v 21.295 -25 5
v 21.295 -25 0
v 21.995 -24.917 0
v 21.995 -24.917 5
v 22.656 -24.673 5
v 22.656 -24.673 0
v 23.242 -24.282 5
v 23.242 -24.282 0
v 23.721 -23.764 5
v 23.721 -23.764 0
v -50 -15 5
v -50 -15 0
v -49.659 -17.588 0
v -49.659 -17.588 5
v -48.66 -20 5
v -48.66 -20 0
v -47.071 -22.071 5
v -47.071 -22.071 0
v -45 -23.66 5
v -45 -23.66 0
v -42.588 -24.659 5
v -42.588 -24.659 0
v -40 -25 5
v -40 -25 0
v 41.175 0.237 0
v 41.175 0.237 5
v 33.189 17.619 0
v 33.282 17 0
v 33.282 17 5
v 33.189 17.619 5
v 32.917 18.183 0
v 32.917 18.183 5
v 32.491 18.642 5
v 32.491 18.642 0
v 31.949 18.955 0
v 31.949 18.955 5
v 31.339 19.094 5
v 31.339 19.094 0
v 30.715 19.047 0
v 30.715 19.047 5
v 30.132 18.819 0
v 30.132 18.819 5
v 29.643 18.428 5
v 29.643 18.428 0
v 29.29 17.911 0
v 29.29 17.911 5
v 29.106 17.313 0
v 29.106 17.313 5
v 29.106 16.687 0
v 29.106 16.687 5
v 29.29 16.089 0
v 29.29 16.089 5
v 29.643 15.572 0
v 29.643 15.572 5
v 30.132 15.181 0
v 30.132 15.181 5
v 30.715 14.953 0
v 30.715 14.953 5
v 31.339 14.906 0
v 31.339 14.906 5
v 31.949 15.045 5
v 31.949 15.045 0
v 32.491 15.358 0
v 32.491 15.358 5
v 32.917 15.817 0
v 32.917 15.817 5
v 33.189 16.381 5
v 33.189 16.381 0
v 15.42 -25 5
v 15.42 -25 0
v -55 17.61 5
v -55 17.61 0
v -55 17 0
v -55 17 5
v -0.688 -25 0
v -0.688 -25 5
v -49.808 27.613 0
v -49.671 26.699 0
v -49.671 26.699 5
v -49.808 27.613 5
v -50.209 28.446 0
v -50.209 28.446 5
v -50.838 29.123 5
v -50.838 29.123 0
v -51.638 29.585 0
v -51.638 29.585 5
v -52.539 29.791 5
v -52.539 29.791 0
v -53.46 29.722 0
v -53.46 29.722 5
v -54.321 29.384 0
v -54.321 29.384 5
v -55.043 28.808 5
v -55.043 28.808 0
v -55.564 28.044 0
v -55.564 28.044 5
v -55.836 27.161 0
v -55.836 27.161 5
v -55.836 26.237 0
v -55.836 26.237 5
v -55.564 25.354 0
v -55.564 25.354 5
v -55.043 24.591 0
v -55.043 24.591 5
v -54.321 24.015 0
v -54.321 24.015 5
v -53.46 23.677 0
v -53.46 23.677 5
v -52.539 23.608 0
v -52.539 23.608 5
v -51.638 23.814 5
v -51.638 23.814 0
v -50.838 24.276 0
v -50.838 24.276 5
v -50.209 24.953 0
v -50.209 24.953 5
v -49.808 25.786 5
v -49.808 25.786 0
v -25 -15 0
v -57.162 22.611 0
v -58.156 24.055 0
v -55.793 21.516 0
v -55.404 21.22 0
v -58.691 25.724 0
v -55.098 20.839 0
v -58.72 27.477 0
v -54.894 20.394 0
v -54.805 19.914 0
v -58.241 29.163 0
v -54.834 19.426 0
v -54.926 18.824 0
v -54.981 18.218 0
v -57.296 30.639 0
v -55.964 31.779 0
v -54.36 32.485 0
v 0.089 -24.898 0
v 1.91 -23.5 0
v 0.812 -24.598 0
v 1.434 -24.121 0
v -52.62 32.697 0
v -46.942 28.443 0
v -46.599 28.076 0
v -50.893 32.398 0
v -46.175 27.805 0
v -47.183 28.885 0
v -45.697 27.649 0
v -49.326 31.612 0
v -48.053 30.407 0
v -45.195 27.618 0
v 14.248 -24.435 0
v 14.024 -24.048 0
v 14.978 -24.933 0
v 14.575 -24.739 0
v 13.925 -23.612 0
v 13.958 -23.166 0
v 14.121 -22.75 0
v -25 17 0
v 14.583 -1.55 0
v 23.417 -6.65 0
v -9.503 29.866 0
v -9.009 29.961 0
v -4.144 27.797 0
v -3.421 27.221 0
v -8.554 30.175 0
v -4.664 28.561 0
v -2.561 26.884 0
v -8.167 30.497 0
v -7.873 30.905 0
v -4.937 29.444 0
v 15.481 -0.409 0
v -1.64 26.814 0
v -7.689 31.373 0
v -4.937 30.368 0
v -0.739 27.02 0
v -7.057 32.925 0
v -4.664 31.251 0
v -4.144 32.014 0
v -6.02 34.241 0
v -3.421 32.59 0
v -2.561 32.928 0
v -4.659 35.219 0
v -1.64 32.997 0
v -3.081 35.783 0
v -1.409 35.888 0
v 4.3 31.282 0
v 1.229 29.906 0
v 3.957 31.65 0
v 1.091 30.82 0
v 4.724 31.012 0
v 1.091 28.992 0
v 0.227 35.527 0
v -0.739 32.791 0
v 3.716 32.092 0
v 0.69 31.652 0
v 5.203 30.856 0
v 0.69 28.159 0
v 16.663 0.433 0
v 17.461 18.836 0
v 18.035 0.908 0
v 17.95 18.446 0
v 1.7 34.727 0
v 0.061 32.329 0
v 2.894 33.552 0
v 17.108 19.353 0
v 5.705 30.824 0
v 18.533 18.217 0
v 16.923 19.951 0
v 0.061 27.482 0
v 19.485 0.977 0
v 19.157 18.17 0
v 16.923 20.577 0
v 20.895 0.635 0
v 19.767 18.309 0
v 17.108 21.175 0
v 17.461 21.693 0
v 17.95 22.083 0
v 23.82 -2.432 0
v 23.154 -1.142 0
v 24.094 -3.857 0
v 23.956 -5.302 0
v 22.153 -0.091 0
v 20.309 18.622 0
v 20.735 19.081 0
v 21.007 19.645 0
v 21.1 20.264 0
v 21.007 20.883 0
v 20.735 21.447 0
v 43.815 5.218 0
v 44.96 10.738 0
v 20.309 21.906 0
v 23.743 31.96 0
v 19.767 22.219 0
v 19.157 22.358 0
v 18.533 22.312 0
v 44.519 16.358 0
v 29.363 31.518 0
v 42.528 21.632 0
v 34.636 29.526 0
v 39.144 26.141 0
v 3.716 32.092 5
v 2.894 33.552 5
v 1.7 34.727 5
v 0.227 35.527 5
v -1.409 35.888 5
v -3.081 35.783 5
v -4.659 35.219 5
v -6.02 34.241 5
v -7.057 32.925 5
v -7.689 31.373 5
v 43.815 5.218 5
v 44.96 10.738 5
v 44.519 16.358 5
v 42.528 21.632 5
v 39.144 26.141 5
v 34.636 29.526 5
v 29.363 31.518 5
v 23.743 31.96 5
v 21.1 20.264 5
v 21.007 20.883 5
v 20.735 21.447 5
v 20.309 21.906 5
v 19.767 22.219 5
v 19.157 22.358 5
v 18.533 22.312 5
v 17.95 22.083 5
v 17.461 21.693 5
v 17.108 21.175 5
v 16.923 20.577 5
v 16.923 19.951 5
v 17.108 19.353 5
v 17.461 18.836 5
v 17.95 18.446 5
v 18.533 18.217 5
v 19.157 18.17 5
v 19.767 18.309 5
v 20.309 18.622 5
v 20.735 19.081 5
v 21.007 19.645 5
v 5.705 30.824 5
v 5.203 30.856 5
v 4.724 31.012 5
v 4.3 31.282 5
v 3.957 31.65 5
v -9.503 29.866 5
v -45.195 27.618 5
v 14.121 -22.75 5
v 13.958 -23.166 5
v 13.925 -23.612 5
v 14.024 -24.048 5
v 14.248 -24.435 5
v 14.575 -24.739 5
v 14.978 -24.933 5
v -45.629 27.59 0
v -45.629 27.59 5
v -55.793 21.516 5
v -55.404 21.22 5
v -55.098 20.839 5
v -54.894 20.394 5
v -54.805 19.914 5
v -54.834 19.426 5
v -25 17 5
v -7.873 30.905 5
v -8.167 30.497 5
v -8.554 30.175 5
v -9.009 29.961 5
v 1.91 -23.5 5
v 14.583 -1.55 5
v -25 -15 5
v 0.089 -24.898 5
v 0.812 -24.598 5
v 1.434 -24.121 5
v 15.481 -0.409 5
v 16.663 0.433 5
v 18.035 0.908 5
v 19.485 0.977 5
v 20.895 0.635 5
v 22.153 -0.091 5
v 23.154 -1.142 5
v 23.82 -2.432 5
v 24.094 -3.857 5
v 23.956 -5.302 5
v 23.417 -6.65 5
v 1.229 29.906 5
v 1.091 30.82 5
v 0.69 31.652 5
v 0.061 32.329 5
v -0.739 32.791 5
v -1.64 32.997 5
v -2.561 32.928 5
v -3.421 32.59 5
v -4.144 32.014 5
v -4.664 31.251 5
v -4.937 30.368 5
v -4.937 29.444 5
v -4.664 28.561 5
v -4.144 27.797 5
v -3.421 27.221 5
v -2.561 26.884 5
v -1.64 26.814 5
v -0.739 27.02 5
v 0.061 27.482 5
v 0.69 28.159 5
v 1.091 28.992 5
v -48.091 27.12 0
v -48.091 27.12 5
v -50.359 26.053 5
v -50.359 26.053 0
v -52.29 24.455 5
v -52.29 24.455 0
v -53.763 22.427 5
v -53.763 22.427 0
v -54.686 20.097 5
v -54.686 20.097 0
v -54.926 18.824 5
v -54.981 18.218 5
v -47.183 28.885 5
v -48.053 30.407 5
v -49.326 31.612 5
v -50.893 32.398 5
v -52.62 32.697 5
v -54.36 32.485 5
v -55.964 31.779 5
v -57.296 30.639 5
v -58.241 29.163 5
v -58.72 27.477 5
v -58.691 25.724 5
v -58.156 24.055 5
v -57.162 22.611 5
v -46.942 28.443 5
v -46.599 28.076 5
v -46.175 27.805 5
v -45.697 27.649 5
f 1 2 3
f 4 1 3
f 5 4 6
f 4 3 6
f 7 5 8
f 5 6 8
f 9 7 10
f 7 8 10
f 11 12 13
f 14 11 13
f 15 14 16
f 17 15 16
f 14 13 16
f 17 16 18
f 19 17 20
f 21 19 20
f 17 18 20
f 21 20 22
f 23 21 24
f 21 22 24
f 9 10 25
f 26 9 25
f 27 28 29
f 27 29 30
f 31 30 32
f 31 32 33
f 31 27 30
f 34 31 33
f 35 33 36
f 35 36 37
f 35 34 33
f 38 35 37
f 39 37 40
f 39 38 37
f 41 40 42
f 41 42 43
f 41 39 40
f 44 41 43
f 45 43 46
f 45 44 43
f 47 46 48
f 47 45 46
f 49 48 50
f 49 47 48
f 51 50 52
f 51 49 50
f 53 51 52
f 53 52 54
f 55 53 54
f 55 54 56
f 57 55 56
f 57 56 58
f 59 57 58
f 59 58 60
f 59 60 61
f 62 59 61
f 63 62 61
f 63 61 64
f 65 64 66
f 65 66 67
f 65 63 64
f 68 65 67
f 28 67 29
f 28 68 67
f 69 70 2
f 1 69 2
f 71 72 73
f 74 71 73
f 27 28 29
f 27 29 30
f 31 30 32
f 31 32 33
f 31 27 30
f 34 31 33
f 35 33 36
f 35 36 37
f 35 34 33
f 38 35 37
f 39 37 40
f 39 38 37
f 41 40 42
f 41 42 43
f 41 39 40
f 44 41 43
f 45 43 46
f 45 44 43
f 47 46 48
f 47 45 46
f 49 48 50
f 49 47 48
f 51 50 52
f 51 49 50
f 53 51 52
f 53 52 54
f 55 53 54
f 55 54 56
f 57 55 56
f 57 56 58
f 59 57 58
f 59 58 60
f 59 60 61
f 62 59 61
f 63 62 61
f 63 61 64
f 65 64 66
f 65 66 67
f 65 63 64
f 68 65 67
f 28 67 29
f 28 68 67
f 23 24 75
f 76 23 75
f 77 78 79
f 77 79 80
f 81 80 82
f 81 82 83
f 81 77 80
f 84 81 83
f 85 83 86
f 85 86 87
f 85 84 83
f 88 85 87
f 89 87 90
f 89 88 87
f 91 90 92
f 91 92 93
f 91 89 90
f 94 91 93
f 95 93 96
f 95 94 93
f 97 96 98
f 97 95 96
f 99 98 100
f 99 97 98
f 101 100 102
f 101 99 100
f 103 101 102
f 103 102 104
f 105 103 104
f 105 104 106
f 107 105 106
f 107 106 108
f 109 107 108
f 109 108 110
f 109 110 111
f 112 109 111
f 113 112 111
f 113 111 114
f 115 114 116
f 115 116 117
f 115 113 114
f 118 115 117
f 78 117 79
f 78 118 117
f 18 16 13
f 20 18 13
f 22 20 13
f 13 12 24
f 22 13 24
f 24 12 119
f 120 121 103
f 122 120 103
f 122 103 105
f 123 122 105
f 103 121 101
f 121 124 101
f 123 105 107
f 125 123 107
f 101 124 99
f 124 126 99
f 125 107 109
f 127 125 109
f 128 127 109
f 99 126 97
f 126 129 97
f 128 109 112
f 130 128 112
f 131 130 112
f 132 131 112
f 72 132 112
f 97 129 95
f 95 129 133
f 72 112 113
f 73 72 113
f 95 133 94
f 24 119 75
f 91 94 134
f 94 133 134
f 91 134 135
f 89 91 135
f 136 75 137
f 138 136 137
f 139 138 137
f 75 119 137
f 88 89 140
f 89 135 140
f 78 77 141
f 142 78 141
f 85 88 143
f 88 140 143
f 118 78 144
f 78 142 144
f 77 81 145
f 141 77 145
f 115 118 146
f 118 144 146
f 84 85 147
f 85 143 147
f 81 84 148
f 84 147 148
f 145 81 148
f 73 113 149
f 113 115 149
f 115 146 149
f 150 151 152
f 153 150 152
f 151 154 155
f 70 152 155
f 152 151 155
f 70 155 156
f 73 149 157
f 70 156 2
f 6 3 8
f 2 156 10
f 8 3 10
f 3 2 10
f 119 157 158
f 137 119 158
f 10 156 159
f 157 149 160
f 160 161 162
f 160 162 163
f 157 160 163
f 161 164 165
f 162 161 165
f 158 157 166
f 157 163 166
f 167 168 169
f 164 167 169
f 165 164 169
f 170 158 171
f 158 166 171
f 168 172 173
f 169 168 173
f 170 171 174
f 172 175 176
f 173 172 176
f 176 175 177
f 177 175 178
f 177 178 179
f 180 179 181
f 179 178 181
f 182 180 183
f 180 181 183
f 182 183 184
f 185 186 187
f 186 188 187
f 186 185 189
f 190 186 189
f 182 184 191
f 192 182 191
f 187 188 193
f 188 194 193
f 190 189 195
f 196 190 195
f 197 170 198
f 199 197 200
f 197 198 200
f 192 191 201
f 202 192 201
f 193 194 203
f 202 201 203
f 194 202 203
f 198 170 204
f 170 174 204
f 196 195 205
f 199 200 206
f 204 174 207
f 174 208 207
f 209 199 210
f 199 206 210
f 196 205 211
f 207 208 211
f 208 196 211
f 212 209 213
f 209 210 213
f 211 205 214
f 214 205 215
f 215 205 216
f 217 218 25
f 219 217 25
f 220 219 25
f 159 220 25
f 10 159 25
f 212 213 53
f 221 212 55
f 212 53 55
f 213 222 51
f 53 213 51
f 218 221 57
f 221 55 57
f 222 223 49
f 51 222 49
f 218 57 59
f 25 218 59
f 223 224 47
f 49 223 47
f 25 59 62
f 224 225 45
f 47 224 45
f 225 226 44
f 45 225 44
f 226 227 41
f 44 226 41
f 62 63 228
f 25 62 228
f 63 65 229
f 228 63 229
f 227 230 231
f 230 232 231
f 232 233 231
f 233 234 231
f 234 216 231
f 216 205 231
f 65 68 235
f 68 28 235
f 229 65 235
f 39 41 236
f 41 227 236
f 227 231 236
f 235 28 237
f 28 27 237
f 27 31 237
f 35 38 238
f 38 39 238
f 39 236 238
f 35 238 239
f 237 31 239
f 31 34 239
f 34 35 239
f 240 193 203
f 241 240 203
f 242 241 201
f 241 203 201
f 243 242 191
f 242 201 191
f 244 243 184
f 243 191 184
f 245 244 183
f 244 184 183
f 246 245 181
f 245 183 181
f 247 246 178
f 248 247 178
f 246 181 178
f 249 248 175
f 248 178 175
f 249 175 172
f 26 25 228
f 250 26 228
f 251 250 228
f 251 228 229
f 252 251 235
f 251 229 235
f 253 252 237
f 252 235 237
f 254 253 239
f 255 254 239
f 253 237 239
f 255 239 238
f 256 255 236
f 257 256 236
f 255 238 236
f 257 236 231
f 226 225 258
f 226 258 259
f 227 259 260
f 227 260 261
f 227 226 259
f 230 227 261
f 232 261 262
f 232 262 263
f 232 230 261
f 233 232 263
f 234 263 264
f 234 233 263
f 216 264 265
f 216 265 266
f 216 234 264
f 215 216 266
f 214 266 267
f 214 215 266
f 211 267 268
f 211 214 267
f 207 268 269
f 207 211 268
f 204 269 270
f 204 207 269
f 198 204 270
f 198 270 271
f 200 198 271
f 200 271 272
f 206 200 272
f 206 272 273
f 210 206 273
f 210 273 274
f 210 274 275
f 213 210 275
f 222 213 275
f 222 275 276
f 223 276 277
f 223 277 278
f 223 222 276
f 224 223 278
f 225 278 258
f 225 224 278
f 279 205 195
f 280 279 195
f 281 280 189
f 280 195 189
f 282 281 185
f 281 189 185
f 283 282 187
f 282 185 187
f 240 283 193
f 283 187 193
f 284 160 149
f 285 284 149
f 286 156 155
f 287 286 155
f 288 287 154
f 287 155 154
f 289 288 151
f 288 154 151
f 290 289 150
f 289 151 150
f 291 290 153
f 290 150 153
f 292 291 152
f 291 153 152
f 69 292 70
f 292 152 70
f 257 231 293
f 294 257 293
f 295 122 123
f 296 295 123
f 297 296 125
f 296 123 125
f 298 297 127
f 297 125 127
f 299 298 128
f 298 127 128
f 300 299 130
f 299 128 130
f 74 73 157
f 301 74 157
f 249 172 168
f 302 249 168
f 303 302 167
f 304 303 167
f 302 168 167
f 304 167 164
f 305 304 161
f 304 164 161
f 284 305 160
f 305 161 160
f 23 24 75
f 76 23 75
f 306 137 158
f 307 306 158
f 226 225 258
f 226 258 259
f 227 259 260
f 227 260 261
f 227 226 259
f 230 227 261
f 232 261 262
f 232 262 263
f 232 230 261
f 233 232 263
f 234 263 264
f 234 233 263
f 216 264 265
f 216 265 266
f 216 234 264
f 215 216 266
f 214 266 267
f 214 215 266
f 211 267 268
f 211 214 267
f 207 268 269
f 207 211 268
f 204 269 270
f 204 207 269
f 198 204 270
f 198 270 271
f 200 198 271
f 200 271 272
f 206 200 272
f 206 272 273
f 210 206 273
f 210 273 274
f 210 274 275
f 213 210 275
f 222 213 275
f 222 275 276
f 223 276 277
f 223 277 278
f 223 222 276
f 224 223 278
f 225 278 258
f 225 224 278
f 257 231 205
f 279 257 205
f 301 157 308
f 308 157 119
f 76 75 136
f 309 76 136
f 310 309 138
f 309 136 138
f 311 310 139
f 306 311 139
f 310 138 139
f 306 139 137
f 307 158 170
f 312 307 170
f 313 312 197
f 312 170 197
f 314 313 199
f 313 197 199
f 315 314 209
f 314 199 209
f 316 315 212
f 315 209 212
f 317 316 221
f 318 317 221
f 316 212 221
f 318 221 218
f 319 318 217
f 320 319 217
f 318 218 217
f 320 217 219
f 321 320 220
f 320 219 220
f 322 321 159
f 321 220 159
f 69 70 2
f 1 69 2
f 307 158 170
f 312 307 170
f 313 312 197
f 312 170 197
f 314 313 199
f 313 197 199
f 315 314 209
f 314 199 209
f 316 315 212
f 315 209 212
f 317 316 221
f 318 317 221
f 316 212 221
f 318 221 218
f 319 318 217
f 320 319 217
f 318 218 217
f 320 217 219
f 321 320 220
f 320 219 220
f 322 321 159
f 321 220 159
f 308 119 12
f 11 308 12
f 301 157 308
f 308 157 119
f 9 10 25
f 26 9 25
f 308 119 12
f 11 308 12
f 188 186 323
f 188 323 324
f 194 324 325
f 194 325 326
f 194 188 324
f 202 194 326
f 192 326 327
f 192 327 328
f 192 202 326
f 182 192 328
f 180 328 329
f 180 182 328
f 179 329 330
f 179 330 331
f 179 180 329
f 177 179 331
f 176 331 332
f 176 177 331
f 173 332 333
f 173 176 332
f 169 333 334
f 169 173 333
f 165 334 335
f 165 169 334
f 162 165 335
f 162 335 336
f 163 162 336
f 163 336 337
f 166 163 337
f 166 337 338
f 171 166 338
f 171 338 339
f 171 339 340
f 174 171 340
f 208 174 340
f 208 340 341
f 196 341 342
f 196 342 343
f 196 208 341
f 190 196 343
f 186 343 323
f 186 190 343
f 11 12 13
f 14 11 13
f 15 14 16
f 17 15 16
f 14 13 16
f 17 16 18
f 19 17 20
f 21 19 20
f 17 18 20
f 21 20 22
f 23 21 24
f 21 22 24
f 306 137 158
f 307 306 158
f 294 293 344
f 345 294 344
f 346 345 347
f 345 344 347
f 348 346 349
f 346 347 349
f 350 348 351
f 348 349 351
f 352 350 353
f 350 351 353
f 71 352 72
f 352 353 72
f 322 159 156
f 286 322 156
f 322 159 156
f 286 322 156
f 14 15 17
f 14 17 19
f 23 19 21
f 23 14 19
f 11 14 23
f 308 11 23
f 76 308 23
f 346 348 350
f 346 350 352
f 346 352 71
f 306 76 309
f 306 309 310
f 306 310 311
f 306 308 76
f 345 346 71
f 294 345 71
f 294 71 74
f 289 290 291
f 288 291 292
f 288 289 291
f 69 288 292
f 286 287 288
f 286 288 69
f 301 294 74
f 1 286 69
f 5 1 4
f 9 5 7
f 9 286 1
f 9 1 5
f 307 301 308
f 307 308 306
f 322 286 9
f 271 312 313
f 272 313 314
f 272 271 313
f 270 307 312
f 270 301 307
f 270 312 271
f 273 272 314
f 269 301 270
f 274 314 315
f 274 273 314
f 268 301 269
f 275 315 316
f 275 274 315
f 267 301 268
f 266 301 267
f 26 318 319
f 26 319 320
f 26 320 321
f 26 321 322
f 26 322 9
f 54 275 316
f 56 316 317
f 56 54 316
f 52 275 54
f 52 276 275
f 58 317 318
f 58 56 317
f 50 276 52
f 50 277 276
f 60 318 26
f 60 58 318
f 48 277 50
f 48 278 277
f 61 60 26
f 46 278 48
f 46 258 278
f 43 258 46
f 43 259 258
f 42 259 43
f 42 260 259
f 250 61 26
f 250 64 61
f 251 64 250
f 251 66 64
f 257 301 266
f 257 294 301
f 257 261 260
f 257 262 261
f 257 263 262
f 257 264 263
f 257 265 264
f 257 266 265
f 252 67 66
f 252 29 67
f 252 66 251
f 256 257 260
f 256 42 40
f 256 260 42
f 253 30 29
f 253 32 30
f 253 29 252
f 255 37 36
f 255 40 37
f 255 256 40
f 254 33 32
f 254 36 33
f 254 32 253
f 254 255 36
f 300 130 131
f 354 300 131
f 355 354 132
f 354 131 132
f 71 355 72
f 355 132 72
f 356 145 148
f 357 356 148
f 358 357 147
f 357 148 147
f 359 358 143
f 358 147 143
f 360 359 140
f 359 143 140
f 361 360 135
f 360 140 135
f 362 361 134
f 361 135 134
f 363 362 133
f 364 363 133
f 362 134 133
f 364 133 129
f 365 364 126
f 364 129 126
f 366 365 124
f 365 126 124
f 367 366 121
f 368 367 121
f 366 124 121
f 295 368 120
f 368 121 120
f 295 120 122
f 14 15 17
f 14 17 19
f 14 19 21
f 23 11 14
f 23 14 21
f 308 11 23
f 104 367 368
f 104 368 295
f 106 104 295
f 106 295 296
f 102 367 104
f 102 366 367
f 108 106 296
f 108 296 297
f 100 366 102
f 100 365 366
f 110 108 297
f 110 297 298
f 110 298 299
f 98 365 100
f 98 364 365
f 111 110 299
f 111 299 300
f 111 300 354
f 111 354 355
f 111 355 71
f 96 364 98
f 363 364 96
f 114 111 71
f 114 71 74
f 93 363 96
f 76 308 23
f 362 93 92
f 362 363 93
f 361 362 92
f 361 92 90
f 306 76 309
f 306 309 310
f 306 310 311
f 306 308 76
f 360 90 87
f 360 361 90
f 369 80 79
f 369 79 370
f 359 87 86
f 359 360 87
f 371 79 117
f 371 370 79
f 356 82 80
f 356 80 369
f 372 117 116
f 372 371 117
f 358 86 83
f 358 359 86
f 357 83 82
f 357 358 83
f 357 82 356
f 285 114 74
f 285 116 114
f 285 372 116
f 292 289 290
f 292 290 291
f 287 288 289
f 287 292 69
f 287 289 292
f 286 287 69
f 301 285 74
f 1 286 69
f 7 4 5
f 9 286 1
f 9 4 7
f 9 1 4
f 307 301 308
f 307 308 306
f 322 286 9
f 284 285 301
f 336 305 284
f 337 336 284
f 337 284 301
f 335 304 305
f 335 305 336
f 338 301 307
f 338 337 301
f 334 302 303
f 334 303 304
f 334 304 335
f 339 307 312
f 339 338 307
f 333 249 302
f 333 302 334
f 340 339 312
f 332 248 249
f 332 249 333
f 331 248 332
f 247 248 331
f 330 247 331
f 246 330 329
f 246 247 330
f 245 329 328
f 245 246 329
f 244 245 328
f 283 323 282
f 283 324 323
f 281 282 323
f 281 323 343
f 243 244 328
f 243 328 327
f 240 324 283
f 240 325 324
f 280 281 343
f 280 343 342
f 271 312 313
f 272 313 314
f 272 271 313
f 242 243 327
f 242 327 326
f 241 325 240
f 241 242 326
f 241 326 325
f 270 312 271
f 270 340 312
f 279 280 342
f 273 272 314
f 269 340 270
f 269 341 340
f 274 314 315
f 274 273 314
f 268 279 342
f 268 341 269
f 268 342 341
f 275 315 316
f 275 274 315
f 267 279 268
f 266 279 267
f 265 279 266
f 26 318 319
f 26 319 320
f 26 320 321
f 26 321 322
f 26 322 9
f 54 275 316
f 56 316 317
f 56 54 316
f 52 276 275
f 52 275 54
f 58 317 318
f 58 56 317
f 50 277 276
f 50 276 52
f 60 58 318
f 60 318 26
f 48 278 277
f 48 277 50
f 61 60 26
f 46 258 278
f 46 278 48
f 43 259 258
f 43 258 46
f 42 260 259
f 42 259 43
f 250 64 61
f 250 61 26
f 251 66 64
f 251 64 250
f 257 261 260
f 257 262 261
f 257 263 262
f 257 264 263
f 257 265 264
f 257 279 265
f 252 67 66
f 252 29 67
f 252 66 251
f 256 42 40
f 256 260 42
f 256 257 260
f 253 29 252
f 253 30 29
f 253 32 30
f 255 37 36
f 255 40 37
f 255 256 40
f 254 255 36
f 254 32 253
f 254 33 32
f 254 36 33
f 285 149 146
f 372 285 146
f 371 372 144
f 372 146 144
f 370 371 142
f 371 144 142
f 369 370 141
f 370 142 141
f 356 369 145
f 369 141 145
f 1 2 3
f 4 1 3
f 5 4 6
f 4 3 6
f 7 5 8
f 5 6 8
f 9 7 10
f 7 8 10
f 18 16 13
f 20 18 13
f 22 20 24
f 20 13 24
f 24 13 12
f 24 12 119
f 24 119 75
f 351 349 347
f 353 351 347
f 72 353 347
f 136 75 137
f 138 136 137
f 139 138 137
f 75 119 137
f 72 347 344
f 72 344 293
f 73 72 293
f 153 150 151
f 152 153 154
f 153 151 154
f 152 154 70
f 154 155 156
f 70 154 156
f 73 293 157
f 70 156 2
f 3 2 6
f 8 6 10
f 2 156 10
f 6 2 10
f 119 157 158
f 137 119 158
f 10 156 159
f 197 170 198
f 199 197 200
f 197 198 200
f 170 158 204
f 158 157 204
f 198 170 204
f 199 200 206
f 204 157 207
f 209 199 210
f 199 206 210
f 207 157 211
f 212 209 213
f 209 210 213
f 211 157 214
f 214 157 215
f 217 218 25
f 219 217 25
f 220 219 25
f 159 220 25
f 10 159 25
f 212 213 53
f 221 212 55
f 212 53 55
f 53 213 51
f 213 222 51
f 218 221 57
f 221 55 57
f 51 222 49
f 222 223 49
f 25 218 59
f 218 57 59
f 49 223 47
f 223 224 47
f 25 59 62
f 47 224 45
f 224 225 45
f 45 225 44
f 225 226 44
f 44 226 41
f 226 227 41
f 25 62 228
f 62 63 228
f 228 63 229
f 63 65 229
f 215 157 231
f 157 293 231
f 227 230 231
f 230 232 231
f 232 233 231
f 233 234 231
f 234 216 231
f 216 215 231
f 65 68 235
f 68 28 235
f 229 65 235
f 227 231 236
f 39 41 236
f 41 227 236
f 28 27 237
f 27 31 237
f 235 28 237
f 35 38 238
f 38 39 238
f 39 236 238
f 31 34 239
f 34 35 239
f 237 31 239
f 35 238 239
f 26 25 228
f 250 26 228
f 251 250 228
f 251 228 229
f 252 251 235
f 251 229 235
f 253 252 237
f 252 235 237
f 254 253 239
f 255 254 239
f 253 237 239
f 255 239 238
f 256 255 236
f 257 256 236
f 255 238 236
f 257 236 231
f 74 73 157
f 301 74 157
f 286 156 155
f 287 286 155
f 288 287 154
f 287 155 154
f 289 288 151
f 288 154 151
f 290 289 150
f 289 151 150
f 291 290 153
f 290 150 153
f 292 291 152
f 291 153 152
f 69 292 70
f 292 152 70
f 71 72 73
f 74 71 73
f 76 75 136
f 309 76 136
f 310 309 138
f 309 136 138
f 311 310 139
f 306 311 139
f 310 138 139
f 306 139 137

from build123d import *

# Parameters (mm, degrees)
F0_R     = 2.1
F1_DEPTH = 5
F2_R     = 3.1
F2_R_2   = 2.1
F3_DEPTH = 5


with BuildPart() as f1:
    # F0 (on Top) → F1 (new body)
    with BuildSketch(Plane.XY):
        with BuildLine():
            Line((-55, 17), (-25, 17))
            Line((-25, 17), (-25, -15))
            Line((-25, -15), (-50, -15))
            ThreePointArc((-50, -15), (-47.071068, -22.071068), (-40, -25))
            Line((-40, -25), (-0.687644, -25))
            ThreePointArc((-0.687644, -25), (0.812356, -24.598076), (1.910432, -23.5))
            Line((1.910432, -23.5), (14.58327, -1.55))
            ThreePointArc((14.58327, -1.55), (21.55, 0.31673), (23.41673, -6.65))
            Line((23.41673, -6.65), (14.12139, -22.75))
            ThreePointArc((14.12139, -22.75), (14.12139, -24.25), (15.420428, -25))
            Line((15.420428, -25), (21.294605, -25))
            ThreePointArc((21.294605, -25), (22.65599, -24.673318), (23.720882, -23.764421))
            Line((23.720882, -23.764421), (41.175178, 0.237193))
            ThreePointArc((41.175178, 0.237193), (42.52786, 21.631933), (23.742581, 31.960433))
            Line((23.742581, 31.960433), (-45.628709, 27.59035))
            ThreePointArc((-45.628709, 27.59035), (-52.289962, 24.45531), (-55, 17.610133))
            Line((-55, 17.610133), (-55, 17))
        make_face()
        with Locations((31.182091, 17)):
            Circle(F0_R, mode=Mode.SUBTRACT)
        with Locations((19, 20.264181)):
            Circle(F0_R, mode=Mode.SUBTRACT)
    extrude(amount=F1_DEPTH)


with BuildPart() as f3:
    # F2 (on Top) → F3 (new body)
    with BuildSketch(Plane.XY):
        with BuildLine():
            Line((-55, 17), (-25, 17))
            Line((-25, 17), (-25, -15))
            Line((-25, -15), (-50, -15))
            ThreePointArc((-50, -15), (-47.071068, -22.071068), (-40, -25))
            Line((-40, -25), (-0.687644, -25))
            ThreePointArc((-0.687644, -25), (0.812356, -24.598076), (1.910432, -23.5))
            Line((1.910432, -23.5), (14.58327, -1.55))
            ThreePointArc((14.58327, -1.55), (21.55, 0.31673), (23.41673, -6.65))
            Line((23.41673, -6.65), (14.12139, -22.75))
            ThreePointArc((14.12139, -22.75), (14.12139, -24.25), (15.420428, -25))
            Line((15.420428, -25), (21.294605, -25))
            ThreePointArc((21.294605, -25), (22.65599, -24.673318), (23.720882, -23.764421))
            Line((23.720882, -23.764421), (41.175178, 0.237193))
            ThreePointArc((41.175178, 0.237193), (42.52786, 21.631933), (23.742581, 31.960433))
            Line((23.742581, 31.960433), (5.704582, 30.824119))
            ThreePointArc((5.704582, 30.824119), (4.503784, 31.133671), (3.716274, 32.091569))
            ThreePointArc((3.716274, 32.091569), (-2.248649, 35.893919), (-7.689248, 31.373072))
            ThreePointArc((-7.689248, 31.373072), (-8.350322, 30.32392), (-9.502781, 29.866123))
            Line((-9.502781, 29.866123), (-45.194523, 27.617702))
            ThreePointArc((-45.194523, 27.617702), (-46.395321, 27.927253), (-47.182831, 28.885151))
            ThreePointArc((-47.182831, 28.885151), (-56.671805, 31.257884), (-55.793083, 21.516306))
            ThreePointArc((-55.793083, 21.516306), (-54.982795, 20.622631), (-54.833835, 19.425537))
            ThreePointArc((-54.833835, 19.425537), (-54.958372, 18.52163), (-55, 17.610133))
            Line((-55, 17.610133), (-55, 17))
        make_face()
        with Locations((-52.770528, 26.699371)):
            Circle(F2_R, mode=Mode.SUBTRACT)
        with Locations((19, 20.264181)):
            Circle(F2_R_2, mode=Mode.SUBTRACT)
        with Locations((31.182091, 17)):
            Circle(F2_R_2, mode=Mode.SUBTRACT)
        with Locations((-1.871423, 29.905789)):
            Circle(F2_R, mode=Mode.SUBTRACT)
    extrude(amount=F3_DEPTH)


solid = Compound([f1.part, f3.part])
